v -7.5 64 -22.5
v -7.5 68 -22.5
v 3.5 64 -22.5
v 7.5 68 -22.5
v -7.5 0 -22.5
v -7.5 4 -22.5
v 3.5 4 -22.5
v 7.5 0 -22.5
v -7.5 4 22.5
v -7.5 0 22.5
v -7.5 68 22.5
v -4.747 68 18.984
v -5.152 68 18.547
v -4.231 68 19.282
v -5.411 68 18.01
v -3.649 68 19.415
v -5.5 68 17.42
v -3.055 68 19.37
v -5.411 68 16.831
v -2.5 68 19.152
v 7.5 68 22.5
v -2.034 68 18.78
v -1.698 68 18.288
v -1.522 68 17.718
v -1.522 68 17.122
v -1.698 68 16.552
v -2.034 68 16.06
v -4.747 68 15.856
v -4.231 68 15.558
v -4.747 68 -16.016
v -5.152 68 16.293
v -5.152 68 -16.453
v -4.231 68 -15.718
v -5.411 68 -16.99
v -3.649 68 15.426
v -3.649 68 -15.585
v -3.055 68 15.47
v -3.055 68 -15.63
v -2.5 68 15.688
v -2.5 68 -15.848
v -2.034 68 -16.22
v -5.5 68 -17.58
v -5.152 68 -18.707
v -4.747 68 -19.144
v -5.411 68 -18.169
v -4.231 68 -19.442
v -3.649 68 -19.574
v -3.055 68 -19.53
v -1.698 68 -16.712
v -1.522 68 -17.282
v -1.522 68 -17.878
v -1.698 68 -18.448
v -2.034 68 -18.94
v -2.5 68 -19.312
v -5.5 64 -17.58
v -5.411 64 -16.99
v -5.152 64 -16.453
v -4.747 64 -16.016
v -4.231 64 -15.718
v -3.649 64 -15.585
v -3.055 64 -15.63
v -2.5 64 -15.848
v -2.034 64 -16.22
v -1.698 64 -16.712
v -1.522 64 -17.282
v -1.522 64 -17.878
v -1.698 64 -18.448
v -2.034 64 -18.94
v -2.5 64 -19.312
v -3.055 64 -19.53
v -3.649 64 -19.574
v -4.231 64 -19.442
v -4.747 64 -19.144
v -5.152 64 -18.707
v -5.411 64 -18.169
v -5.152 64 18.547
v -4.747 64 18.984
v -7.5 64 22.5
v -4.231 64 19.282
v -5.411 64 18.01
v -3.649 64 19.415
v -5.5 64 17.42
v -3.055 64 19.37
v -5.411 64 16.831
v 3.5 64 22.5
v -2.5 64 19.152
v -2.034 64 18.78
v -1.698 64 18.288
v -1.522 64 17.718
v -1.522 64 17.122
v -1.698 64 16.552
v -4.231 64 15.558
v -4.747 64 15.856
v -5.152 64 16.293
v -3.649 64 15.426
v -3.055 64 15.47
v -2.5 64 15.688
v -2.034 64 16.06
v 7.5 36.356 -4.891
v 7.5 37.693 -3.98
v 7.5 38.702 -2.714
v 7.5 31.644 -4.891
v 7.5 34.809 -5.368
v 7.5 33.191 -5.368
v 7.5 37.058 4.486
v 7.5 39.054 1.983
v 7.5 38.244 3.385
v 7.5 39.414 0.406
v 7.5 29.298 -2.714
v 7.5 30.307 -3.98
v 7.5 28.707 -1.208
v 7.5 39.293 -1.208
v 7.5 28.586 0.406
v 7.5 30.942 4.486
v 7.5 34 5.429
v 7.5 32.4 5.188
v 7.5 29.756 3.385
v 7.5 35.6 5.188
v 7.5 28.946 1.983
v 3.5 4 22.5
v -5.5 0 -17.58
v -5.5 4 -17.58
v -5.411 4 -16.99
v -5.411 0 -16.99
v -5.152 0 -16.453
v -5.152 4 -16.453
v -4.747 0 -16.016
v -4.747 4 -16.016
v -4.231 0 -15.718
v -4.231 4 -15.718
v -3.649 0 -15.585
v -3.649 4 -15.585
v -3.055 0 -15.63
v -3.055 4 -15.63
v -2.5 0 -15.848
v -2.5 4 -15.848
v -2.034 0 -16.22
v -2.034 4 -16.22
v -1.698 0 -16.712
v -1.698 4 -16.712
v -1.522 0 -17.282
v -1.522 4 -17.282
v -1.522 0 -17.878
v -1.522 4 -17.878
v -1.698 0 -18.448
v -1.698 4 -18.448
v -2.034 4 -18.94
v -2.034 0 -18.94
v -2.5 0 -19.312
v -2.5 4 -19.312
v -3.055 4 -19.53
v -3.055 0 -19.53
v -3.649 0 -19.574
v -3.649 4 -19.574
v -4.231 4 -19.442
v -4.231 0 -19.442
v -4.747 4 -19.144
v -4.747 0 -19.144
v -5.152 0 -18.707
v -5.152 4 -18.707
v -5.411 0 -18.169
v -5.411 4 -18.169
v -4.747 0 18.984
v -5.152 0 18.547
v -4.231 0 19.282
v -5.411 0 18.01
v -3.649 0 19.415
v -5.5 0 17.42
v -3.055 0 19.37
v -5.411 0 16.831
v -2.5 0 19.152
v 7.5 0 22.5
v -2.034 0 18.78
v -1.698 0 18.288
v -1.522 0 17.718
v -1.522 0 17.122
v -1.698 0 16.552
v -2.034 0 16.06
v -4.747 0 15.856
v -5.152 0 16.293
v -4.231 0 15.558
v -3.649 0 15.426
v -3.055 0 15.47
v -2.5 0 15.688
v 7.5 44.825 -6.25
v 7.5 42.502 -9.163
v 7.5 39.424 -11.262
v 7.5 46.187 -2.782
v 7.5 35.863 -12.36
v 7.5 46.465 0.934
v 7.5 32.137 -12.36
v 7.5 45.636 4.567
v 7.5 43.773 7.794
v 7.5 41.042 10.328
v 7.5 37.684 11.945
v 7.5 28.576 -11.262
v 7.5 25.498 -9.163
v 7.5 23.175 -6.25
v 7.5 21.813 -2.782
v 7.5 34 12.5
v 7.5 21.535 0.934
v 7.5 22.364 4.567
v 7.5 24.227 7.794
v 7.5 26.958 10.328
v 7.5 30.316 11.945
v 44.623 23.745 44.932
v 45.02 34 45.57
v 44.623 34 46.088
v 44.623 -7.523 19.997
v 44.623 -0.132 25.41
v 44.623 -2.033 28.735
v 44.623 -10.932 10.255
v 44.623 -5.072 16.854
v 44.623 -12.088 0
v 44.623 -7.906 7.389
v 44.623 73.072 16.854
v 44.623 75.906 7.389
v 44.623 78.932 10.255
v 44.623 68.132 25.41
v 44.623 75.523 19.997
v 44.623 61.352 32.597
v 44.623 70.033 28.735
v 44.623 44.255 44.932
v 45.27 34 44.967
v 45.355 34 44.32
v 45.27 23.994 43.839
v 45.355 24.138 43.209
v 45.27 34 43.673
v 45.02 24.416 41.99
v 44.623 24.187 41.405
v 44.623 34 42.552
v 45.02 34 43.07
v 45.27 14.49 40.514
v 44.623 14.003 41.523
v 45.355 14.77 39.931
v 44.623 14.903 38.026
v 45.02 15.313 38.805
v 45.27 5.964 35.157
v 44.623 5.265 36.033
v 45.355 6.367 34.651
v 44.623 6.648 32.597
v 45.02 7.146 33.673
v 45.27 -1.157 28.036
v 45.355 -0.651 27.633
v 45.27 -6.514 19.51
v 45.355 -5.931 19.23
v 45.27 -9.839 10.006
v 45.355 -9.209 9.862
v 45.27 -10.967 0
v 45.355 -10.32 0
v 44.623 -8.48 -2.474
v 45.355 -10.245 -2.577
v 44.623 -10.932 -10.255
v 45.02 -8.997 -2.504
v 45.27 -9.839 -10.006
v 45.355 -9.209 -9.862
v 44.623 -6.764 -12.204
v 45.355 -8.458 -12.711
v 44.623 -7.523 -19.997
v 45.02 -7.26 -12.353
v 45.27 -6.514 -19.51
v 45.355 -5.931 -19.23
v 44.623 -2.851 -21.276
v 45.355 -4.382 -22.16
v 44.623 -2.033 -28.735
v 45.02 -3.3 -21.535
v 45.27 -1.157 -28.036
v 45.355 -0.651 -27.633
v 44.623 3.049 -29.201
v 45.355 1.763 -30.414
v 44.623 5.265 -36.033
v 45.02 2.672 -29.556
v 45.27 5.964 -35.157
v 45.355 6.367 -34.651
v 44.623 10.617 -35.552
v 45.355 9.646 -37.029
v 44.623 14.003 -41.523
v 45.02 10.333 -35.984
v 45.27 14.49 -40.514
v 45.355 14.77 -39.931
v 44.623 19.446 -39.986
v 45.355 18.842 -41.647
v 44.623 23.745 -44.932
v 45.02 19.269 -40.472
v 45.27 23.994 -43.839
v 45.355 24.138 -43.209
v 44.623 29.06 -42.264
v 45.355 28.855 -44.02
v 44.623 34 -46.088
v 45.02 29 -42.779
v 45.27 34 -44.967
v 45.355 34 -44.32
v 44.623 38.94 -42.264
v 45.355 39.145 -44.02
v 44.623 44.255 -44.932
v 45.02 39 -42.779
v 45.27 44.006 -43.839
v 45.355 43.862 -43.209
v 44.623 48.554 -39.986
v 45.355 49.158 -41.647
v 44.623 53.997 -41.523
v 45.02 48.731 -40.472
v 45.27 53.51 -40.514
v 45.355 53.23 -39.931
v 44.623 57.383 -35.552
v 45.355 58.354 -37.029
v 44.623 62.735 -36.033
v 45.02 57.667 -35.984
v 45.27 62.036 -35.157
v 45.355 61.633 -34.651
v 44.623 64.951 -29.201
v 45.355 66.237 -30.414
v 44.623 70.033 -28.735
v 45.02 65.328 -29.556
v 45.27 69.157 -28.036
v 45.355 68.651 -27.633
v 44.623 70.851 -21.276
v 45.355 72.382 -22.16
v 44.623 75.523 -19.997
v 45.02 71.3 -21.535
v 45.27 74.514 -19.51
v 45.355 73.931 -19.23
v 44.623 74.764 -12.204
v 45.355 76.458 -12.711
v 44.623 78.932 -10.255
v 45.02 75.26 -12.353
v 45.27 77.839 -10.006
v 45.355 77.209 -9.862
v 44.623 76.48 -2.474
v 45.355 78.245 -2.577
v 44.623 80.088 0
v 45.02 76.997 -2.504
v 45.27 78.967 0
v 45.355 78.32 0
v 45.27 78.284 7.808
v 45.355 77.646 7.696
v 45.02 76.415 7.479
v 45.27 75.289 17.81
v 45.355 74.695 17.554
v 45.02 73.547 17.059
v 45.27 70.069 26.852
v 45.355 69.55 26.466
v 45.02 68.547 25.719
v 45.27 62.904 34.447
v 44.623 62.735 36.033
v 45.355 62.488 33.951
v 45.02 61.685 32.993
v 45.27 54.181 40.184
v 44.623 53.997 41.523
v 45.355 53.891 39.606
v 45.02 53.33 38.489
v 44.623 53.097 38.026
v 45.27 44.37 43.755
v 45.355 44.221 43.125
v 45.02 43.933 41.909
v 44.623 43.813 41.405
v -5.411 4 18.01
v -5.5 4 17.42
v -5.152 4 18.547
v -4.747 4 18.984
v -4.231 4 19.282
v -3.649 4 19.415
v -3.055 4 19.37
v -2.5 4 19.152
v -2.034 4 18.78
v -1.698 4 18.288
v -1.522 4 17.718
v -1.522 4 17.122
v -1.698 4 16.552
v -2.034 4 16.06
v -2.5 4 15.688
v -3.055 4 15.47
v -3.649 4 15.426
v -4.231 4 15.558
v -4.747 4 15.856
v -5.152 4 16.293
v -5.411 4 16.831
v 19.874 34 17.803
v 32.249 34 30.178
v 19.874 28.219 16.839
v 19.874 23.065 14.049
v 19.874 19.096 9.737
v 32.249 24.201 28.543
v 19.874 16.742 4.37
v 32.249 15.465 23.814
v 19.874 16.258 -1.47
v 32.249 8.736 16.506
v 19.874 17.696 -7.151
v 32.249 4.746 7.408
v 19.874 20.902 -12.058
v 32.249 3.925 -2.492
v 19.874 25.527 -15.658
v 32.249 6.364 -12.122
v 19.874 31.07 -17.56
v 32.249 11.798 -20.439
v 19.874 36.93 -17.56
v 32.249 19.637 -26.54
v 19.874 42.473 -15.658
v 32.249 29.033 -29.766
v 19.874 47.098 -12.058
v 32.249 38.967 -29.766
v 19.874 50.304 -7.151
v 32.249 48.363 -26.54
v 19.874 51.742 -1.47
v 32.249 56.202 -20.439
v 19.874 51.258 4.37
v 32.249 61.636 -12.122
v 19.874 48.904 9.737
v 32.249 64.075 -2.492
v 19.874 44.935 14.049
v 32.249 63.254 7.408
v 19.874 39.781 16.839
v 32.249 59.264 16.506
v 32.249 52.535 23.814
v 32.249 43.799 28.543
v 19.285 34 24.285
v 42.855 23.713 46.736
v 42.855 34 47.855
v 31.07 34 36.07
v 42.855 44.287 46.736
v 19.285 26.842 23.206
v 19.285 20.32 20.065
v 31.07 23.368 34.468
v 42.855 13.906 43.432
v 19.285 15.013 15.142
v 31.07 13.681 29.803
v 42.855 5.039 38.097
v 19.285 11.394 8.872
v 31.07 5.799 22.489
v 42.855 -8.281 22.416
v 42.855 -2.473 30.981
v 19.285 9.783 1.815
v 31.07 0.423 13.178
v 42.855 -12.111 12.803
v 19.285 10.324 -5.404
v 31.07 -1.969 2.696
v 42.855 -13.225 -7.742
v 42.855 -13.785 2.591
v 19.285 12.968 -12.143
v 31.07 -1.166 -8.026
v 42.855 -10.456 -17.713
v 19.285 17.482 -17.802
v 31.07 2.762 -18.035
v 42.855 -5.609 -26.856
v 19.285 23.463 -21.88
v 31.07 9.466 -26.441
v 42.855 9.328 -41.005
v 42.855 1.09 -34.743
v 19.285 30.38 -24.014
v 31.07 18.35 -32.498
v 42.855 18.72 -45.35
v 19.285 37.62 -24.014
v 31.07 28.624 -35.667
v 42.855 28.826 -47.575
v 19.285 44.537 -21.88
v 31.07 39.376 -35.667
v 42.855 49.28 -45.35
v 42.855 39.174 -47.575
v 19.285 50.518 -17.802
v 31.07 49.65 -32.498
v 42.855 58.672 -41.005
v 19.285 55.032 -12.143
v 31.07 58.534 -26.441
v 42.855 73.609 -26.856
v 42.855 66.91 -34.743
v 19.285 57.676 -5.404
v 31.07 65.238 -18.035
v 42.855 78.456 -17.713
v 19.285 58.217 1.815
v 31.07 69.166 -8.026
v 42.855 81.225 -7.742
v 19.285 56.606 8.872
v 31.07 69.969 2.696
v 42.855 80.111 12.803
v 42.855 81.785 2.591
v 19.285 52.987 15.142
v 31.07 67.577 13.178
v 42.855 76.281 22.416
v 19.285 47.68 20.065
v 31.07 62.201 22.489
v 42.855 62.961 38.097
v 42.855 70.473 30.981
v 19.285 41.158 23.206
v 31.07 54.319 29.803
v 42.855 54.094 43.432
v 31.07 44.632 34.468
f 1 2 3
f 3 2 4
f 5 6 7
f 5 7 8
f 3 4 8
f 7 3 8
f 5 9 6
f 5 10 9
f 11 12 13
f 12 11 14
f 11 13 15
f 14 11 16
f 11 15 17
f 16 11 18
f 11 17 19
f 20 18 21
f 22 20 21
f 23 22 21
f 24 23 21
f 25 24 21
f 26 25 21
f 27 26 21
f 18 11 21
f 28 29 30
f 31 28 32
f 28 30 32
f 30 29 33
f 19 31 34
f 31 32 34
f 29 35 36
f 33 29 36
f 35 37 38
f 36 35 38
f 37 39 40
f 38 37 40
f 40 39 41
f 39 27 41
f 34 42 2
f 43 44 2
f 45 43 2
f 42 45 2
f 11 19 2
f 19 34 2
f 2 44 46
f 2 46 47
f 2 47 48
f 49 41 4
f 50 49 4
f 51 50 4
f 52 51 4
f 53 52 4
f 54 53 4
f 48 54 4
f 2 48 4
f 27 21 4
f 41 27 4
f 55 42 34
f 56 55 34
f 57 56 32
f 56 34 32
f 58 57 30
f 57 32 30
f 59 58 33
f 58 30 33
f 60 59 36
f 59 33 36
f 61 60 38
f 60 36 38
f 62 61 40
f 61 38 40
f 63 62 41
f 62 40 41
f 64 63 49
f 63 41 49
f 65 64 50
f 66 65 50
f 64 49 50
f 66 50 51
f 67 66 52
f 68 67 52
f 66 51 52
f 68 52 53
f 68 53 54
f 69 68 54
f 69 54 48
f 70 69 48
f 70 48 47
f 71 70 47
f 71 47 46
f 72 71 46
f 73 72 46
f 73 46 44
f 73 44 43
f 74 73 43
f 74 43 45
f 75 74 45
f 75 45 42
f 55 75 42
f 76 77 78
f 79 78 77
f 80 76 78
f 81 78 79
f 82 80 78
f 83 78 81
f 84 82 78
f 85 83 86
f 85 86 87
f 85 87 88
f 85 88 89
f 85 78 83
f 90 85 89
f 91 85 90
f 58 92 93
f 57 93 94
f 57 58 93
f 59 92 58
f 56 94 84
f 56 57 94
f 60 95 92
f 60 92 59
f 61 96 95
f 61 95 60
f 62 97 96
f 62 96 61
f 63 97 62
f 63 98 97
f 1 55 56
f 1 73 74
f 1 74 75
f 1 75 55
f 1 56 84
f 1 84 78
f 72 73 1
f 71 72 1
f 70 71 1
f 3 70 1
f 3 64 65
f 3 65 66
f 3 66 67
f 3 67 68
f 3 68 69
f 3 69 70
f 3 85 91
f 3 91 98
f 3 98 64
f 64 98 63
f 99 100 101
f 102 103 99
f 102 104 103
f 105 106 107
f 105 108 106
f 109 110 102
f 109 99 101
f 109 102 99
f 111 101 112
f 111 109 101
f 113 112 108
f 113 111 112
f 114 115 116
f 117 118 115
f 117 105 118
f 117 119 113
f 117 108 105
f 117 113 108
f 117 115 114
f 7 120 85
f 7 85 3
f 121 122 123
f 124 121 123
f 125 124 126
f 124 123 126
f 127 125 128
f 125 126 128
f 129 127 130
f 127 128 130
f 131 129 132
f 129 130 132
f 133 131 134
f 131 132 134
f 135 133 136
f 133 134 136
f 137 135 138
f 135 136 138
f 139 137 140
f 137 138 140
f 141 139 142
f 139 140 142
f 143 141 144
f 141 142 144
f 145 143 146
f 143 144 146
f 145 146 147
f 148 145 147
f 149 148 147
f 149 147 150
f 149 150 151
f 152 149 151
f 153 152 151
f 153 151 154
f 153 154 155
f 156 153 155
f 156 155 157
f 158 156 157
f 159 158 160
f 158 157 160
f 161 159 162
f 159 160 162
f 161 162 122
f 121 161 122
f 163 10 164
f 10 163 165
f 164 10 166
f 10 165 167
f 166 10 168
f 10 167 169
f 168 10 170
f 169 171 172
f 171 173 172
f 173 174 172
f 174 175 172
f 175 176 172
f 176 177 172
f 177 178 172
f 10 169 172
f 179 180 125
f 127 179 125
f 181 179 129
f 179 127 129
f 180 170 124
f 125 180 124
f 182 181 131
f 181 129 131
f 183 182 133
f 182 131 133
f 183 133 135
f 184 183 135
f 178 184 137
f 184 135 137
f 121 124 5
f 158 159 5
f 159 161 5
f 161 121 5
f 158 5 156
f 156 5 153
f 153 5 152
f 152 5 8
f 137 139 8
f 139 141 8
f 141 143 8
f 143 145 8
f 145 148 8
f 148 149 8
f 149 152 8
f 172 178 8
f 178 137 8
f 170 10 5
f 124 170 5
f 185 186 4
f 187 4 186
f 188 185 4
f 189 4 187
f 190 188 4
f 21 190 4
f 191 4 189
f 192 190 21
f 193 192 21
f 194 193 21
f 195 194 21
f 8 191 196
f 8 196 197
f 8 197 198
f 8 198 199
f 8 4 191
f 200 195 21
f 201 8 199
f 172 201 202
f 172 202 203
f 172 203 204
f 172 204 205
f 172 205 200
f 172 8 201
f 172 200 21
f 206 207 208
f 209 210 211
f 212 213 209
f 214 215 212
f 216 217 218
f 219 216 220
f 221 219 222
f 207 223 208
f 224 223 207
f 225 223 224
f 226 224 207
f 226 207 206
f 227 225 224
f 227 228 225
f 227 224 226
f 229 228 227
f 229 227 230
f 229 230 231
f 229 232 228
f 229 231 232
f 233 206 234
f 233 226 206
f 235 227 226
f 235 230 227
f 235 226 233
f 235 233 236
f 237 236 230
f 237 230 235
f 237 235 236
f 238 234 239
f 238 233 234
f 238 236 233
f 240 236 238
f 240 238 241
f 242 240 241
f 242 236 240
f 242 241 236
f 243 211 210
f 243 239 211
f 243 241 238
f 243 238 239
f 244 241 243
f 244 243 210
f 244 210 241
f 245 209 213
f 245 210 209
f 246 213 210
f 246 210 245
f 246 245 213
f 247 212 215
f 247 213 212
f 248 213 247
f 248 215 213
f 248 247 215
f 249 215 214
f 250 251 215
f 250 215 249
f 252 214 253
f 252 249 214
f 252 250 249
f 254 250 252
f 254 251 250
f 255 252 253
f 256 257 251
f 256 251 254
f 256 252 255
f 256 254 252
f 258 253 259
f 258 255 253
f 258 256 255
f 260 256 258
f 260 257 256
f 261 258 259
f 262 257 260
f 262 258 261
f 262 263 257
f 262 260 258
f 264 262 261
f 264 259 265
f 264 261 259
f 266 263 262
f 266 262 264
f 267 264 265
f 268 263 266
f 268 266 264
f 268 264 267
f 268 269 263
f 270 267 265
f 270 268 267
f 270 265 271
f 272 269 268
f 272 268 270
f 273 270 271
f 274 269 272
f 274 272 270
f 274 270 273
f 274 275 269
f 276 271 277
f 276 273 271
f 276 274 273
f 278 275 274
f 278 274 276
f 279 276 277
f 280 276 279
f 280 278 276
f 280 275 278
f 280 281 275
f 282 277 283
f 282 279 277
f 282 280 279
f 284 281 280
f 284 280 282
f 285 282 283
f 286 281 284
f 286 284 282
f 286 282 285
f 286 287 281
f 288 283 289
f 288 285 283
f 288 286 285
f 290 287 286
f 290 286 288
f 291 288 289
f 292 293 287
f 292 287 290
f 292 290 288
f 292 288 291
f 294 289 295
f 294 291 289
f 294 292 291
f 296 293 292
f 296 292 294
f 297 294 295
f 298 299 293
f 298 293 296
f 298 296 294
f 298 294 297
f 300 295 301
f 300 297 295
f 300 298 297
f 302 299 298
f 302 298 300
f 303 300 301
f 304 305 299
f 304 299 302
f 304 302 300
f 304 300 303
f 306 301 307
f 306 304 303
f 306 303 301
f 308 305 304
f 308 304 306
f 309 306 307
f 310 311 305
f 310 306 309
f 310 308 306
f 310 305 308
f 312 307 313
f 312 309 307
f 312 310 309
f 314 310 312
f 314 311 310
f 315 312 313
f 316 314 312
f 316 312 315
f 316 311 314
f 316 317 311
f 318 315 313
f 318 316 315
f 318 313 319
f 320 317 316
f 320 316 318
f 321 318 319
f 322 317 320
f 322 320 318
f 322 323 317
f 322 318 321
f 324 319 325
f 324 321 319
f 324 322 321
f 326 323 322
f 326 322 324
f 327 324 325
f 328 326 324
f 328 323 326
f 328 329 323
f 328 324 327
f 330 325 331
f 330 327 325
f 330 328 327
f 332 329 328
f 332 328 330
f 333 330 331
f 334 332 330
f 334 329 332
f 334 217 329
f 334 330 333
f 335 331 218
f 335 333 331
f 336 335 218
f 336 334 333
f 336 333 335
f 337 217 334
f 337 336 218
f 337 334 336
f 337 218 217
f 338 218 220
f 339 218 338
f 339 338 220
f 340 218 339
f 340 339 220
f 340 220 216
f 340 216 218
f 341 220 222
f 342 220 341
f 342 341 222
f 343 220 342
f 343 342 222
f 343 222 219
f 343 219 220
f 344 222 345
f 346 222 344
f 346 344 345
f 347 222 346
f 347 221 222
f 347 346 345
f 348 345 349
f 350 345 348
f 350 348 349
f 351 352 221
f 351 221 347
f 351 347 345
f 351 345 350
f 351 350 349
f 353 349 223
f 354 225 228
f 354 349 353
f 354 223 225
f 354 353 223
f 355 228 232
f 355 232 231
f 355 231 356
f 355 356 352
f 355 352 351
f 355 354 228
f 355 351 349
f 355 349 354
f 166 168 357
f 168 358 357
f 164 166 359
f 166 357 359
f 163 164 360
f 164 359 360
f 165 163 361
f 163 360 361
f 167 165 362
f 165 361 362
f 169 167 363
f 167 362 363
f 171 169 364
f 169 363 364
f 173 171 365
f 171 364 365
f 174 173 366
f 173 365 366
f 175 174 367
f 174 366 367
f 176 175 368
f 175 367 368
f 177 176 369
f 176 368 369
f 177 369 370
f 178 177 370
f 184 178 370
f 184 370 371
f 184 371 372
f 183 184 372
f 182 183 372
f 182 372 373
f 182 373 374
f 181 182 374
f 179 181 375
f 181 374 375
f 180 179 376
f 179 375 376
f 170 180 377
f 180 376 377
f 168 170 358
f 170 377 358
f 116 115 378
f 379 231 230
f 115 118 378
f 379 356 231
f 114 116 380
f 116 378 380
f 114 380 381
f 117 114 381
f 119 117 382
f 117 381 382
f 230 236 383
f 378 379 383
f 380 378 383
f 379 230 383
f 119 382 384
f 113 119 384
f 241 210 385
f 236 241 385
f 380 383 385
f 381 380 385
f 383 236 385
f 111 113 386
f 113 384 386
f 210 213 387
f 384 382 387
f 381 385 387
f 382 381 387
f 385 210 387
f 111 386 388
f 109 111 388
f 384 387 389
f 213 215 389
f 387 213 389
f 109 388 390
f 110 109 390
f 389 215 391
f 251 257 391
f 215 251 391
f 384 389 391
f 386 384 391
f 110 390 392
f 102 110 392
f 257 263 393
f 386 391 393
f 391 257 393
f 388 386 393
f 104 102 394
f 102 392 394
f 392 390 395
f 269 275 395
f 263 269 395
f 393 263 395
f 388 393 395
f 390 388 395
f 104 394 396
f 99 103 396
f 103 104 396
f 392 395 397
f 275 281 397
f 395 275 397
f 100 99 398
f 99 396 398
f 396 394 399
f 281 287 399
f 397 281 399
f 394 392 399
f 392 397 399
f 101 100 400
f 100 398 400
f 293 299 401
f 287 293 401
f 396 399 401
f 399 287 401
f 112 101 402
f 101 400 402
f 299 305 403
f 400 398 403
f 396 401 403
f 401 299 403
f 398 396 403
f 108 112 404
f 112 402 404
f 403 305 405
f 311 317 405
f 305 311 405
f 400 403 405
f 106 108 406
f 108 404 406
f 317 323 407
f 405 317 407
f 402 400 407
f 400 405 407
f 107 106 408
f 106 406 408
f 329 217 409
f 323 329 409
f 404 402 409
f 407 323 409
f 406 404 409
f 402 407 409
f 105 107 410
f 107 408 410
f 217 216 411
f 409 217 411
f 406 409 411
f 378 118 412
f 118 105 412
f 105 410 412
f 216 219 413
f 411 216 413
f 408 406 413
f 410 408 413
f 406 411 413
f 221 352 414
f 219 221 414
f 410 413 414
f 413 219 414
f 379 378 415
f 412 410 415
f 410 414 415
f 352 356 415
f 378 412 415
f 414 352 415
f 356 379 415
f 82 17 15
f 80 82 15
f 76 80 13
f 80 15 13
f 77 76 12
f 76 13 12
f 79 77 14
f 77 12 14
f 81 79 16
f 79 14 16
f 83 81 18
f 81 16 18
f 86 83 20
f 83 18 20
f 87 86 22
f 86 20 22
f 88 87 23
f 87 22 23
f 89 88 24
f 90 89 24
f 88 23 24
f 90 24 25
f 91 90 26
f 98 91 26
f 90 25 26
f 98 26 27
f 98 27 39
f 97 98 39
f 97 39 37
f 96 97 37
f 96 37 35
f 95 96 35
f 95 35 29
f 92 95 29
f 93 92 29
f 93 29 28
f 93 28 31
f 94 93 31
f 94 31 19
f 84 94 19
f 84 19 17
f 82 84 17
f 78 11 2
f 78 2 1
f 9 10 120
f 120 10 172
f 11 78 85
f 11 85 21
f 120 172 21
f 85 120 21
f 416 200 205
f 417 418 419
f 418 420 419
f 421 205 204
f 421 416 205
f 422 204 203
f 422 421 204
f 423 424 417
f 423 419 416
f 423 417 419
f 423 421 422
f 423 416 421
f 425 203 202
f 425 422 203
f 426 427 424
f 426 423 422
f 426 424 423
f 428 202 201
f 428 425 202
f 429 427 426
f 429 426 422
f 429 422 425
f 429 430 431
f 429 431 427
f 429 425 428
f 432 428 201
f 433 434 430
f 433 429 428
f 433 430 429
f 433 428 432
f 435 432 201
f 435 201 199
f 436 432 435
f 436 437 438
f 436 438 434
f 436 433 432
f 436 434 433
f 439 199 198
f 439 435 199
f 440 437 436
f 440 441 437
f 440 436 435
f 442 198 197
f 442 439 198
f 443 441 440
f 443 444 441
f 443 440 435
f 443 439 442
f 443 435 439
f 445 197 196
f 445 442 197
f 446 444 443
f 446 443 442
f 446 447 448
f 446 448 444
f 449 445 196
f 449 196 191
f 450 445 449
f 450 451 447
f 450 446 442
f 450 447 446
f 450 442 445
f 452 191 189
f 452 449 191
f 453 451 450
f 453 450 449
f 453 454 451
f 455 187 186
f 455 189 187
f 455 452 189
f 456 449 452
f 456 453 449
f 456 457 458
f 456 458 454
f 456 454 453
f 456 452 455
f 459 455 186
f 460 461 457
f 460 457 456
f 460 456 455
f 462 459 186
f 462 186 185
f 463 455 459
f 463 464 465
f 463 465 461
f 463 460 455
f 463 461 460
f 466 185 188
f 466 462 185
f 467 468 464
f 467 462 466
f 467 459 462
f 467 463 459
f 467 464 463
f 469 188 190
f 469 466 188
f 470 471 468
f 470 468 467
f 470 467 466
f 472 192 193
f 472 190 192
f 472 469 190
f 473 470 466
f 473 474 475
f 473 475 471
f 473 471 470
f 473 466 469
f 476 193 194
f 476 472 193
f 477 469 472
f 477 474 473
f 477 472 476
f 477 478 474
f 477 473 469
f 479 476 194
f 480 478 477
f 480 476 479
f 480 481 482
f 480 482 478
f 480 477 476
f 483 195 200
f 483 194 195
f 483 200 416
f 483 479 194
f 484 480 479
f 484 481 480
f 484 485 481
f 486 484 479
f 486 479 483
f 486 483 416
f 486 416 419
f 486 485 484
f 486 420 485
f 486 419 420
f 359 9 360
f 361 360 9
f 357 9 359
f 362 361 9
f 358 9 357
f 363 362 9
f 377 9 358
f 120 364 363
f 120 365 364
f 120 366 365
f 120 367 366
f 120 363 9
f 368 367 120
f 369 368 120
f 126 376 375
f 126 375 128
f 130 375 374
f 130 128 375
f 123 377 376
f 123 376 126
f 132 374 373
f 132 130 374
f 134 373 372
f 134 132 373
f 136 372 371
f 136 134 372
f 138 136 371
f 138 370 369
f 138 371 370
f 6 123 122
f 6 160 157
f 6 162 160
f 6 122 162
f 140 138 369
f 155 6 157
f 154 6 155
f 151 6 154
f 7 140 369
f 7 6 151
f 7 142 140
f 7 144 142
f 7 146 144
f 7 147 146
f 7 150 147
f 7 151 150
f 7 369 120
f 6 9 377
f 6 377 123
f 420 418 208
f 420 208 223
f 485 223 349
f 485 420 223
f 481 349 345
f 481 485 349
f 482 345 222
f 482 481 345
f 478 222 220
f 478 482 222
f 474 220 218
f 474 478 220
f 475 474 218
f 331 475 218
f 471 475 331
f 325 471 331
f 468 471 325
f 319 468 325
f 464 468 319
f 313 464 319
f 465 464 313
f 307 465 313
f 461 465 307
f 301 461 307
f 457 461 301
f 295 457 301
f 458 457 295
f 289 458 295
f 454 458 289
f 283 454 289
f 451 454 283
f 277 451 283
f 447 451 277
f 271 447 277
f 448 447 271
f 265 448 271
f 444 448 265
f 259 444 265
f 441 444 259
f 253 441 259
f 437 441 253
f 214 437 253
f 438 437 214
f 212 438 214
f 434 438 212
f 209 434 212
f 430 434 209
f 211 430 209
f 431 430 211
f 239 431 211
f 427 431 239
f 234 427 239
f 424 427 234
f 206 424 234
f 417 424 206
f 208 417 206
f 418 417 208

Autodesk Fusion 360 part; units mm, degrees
sketch "Sketch1" plane through (0, 0, 0) normal (0, 1, 0) x (1, 0, 0)
  line L0 (7.5, -22.5) -> (-7.5, -22.5)
  line L1 (-7.5, -22.5) -> (-7.5, 22.5)
  line L2 (-7.5, 22.5) -> (7.5, 22.5)
  line L3 (7.5, 22.5) -> (7.5, -22.5)
  line L4 (7.5, -22.5) -> (-7.5, 22.5) construction
  line L5 (-7.5, -22.5) -> (7.5, 22.5) construction
  dimension "d1" = 45
  dimension "d2" = 15
extrude "Extrude1" add sketch "Sketch1" along normal blind 4
sketch "Sketch2" plane through (0, 4, 0) normal (0, 1, 0) x (-1, 0, 0)
  line L0 (-7.5, -22.5) -> (7.5, -22.5)
  line L1 (7.5, -22.5) -> (7.5, 22.5)
  line L2 (7.5, 22.5) -> (-7.5, 22.5)
  line L3 (-7.5, 22.5) -> (-7.5, -22.5)
  line L4 (-7.5, 22.5) -> (-3.5, 22.5)
  line L5 (-3.5, 22.5) -> (-3.5, -22.5)
  line L6 (-3.5, -22.5) -> (-7.5, -22.5)
  line L7 (-7.5, -22.5) -> (-7.5, 22.5)
  dimension "d9" = 4
extrude "Extrude2" add sketch "Sketch2" along normal blind 64 contours L0 L2 L3 L4 L5 L6 L7
sketch "Sketch3" plane through (3.5, 0, 0) normal (-1, 0, 0) x (0, -1, 0)
  line L0 (-4, -22.5) -> (-4, 22.5)
  line L1 (-4, 22.5) -> (-68, 22.5)
  line L2 (-68, 22.5) -> (-68, -22.5)
  line L3 (-68, -22.5) -> (-4, -22.5)
  line L4 (-68, 22.5) -> (-64, 22.5)
  line L5 (-64, 22.5) -> (-64, -22.5)
  line L6 (-64, -22.5) -> (-68, -22.5)
  line L7 (-68, -22.5) -> (-68, 22.5)
  dimension "d12" = 4
extrude "Extrude3" add sketch "Sketch3" along normal blind 11 contours L1 L2 L3 L4 L5 L6 L7
sketch "Sketch4" plane through (3.5, 0, 0) normal (-1, 0, 0) x (0, -1, 0)
  line L0 (-64, 22.5) -> (-64, -22.5)
  line L1 (-64, -22.5) -> (-4, -22.5)
  line L2 (-4, -22.5) -> (-4, 22.5)
  line L3 (-4, 22.5) -> (-64, 22.5)
  line L4 (-60, 22.5) -> (-56, 22.5)
  line L5 (-56, 22.5) -> (-56, -22.5)
  line L6 (-56, -22.5) -> (-60, -22.5)
  line L7 (-60, -22.5) -> (-60, 22.5)
  line L8 (-34, -22.5) -> (-34, 22.5) construction
  line L9 (-8, 22.5) -> (-12, 22.5)
  line L10 (-8, -22.5) -> (-8, 22.5)
  line L11 (-12, 22.5) -> (-12, -22.5)
  line L12 (-12, -22.5) -> (-8, -22.5)
  dimension "d15" = 4
  dimension "d16" = 4
sketch "Sketch5" plane through (0, 68, 0) normal (0, 1, 0) x (-1, 0, 0)
  line L0 (-7.5, -22.5) -> (7.5, -22.5)
  line L1 (7.5, -22.5) -> (7.5, 22.5)
  line L2 (7.5, 22.5) -> (-7.5, 22.5)
  line L3 (-7.5, 22.5) -> (-7.5, -22.5)
  circle A0 centre (3.5, 17.4201) radius 2
  circle A1 centre (3.5, -17.5799) radius 2
  line L4 (3.5, -17.5799) -> (3.5, 17.4201) construction
  point P0 (3.5, -0.0799)
  dimension "d19" = 4
  dimension "d20" = 4
  dimension "d21" = 35
  dimension "d22" = 4
extrude "Extrude5" cut sketch "Sketch5" against normal through all contours A0 | A1
ref_plane "WorkPlane1" through (0, 34, 0) normal (0, 1, 0) x (0, 0, 1)
sketch "Sketch6" plane through (0, 34, 0) normal (0, 1, 0) x (1, 0, 0)
  line L0 (7.5, -12.5) -> (42.8553, -47.8553)
  line L1 (7.5, 22.5) -> (7.5, -22.5)
  line L2 (7.5, 12.5) -> (7.5, -12.5) construction
  line L3 (7.5, 0) -> (0, 0)
  line L4 (42.8553, -47.8553) -> (44.6231, -46.0876)
  line L5 (44.6231, -42.552) -> (7.5, -5.4289)
  arc A0 (44.6231, -46.0876) -> (44.6231, -42.552) centre (42.8553, -44.3198) ccw
  point P0 (7.5, 0)
  point P1 (46.3909, -44.3198)
  dimension "d25" = 50
  dimension "d26" = 25
  dimension "d27" = 135
  dimension "d29" = 5
  dimension "d30" = 2.5
revolve "Revolve1" add sketch "Sketch6" angle 360 about axis through (7.5, 34, 0) along (-1, 0, 0)
equation "d10 = 56 mm + 8 mm"
equation "d24 = -( 68 / 2 ) * 1 mm"
